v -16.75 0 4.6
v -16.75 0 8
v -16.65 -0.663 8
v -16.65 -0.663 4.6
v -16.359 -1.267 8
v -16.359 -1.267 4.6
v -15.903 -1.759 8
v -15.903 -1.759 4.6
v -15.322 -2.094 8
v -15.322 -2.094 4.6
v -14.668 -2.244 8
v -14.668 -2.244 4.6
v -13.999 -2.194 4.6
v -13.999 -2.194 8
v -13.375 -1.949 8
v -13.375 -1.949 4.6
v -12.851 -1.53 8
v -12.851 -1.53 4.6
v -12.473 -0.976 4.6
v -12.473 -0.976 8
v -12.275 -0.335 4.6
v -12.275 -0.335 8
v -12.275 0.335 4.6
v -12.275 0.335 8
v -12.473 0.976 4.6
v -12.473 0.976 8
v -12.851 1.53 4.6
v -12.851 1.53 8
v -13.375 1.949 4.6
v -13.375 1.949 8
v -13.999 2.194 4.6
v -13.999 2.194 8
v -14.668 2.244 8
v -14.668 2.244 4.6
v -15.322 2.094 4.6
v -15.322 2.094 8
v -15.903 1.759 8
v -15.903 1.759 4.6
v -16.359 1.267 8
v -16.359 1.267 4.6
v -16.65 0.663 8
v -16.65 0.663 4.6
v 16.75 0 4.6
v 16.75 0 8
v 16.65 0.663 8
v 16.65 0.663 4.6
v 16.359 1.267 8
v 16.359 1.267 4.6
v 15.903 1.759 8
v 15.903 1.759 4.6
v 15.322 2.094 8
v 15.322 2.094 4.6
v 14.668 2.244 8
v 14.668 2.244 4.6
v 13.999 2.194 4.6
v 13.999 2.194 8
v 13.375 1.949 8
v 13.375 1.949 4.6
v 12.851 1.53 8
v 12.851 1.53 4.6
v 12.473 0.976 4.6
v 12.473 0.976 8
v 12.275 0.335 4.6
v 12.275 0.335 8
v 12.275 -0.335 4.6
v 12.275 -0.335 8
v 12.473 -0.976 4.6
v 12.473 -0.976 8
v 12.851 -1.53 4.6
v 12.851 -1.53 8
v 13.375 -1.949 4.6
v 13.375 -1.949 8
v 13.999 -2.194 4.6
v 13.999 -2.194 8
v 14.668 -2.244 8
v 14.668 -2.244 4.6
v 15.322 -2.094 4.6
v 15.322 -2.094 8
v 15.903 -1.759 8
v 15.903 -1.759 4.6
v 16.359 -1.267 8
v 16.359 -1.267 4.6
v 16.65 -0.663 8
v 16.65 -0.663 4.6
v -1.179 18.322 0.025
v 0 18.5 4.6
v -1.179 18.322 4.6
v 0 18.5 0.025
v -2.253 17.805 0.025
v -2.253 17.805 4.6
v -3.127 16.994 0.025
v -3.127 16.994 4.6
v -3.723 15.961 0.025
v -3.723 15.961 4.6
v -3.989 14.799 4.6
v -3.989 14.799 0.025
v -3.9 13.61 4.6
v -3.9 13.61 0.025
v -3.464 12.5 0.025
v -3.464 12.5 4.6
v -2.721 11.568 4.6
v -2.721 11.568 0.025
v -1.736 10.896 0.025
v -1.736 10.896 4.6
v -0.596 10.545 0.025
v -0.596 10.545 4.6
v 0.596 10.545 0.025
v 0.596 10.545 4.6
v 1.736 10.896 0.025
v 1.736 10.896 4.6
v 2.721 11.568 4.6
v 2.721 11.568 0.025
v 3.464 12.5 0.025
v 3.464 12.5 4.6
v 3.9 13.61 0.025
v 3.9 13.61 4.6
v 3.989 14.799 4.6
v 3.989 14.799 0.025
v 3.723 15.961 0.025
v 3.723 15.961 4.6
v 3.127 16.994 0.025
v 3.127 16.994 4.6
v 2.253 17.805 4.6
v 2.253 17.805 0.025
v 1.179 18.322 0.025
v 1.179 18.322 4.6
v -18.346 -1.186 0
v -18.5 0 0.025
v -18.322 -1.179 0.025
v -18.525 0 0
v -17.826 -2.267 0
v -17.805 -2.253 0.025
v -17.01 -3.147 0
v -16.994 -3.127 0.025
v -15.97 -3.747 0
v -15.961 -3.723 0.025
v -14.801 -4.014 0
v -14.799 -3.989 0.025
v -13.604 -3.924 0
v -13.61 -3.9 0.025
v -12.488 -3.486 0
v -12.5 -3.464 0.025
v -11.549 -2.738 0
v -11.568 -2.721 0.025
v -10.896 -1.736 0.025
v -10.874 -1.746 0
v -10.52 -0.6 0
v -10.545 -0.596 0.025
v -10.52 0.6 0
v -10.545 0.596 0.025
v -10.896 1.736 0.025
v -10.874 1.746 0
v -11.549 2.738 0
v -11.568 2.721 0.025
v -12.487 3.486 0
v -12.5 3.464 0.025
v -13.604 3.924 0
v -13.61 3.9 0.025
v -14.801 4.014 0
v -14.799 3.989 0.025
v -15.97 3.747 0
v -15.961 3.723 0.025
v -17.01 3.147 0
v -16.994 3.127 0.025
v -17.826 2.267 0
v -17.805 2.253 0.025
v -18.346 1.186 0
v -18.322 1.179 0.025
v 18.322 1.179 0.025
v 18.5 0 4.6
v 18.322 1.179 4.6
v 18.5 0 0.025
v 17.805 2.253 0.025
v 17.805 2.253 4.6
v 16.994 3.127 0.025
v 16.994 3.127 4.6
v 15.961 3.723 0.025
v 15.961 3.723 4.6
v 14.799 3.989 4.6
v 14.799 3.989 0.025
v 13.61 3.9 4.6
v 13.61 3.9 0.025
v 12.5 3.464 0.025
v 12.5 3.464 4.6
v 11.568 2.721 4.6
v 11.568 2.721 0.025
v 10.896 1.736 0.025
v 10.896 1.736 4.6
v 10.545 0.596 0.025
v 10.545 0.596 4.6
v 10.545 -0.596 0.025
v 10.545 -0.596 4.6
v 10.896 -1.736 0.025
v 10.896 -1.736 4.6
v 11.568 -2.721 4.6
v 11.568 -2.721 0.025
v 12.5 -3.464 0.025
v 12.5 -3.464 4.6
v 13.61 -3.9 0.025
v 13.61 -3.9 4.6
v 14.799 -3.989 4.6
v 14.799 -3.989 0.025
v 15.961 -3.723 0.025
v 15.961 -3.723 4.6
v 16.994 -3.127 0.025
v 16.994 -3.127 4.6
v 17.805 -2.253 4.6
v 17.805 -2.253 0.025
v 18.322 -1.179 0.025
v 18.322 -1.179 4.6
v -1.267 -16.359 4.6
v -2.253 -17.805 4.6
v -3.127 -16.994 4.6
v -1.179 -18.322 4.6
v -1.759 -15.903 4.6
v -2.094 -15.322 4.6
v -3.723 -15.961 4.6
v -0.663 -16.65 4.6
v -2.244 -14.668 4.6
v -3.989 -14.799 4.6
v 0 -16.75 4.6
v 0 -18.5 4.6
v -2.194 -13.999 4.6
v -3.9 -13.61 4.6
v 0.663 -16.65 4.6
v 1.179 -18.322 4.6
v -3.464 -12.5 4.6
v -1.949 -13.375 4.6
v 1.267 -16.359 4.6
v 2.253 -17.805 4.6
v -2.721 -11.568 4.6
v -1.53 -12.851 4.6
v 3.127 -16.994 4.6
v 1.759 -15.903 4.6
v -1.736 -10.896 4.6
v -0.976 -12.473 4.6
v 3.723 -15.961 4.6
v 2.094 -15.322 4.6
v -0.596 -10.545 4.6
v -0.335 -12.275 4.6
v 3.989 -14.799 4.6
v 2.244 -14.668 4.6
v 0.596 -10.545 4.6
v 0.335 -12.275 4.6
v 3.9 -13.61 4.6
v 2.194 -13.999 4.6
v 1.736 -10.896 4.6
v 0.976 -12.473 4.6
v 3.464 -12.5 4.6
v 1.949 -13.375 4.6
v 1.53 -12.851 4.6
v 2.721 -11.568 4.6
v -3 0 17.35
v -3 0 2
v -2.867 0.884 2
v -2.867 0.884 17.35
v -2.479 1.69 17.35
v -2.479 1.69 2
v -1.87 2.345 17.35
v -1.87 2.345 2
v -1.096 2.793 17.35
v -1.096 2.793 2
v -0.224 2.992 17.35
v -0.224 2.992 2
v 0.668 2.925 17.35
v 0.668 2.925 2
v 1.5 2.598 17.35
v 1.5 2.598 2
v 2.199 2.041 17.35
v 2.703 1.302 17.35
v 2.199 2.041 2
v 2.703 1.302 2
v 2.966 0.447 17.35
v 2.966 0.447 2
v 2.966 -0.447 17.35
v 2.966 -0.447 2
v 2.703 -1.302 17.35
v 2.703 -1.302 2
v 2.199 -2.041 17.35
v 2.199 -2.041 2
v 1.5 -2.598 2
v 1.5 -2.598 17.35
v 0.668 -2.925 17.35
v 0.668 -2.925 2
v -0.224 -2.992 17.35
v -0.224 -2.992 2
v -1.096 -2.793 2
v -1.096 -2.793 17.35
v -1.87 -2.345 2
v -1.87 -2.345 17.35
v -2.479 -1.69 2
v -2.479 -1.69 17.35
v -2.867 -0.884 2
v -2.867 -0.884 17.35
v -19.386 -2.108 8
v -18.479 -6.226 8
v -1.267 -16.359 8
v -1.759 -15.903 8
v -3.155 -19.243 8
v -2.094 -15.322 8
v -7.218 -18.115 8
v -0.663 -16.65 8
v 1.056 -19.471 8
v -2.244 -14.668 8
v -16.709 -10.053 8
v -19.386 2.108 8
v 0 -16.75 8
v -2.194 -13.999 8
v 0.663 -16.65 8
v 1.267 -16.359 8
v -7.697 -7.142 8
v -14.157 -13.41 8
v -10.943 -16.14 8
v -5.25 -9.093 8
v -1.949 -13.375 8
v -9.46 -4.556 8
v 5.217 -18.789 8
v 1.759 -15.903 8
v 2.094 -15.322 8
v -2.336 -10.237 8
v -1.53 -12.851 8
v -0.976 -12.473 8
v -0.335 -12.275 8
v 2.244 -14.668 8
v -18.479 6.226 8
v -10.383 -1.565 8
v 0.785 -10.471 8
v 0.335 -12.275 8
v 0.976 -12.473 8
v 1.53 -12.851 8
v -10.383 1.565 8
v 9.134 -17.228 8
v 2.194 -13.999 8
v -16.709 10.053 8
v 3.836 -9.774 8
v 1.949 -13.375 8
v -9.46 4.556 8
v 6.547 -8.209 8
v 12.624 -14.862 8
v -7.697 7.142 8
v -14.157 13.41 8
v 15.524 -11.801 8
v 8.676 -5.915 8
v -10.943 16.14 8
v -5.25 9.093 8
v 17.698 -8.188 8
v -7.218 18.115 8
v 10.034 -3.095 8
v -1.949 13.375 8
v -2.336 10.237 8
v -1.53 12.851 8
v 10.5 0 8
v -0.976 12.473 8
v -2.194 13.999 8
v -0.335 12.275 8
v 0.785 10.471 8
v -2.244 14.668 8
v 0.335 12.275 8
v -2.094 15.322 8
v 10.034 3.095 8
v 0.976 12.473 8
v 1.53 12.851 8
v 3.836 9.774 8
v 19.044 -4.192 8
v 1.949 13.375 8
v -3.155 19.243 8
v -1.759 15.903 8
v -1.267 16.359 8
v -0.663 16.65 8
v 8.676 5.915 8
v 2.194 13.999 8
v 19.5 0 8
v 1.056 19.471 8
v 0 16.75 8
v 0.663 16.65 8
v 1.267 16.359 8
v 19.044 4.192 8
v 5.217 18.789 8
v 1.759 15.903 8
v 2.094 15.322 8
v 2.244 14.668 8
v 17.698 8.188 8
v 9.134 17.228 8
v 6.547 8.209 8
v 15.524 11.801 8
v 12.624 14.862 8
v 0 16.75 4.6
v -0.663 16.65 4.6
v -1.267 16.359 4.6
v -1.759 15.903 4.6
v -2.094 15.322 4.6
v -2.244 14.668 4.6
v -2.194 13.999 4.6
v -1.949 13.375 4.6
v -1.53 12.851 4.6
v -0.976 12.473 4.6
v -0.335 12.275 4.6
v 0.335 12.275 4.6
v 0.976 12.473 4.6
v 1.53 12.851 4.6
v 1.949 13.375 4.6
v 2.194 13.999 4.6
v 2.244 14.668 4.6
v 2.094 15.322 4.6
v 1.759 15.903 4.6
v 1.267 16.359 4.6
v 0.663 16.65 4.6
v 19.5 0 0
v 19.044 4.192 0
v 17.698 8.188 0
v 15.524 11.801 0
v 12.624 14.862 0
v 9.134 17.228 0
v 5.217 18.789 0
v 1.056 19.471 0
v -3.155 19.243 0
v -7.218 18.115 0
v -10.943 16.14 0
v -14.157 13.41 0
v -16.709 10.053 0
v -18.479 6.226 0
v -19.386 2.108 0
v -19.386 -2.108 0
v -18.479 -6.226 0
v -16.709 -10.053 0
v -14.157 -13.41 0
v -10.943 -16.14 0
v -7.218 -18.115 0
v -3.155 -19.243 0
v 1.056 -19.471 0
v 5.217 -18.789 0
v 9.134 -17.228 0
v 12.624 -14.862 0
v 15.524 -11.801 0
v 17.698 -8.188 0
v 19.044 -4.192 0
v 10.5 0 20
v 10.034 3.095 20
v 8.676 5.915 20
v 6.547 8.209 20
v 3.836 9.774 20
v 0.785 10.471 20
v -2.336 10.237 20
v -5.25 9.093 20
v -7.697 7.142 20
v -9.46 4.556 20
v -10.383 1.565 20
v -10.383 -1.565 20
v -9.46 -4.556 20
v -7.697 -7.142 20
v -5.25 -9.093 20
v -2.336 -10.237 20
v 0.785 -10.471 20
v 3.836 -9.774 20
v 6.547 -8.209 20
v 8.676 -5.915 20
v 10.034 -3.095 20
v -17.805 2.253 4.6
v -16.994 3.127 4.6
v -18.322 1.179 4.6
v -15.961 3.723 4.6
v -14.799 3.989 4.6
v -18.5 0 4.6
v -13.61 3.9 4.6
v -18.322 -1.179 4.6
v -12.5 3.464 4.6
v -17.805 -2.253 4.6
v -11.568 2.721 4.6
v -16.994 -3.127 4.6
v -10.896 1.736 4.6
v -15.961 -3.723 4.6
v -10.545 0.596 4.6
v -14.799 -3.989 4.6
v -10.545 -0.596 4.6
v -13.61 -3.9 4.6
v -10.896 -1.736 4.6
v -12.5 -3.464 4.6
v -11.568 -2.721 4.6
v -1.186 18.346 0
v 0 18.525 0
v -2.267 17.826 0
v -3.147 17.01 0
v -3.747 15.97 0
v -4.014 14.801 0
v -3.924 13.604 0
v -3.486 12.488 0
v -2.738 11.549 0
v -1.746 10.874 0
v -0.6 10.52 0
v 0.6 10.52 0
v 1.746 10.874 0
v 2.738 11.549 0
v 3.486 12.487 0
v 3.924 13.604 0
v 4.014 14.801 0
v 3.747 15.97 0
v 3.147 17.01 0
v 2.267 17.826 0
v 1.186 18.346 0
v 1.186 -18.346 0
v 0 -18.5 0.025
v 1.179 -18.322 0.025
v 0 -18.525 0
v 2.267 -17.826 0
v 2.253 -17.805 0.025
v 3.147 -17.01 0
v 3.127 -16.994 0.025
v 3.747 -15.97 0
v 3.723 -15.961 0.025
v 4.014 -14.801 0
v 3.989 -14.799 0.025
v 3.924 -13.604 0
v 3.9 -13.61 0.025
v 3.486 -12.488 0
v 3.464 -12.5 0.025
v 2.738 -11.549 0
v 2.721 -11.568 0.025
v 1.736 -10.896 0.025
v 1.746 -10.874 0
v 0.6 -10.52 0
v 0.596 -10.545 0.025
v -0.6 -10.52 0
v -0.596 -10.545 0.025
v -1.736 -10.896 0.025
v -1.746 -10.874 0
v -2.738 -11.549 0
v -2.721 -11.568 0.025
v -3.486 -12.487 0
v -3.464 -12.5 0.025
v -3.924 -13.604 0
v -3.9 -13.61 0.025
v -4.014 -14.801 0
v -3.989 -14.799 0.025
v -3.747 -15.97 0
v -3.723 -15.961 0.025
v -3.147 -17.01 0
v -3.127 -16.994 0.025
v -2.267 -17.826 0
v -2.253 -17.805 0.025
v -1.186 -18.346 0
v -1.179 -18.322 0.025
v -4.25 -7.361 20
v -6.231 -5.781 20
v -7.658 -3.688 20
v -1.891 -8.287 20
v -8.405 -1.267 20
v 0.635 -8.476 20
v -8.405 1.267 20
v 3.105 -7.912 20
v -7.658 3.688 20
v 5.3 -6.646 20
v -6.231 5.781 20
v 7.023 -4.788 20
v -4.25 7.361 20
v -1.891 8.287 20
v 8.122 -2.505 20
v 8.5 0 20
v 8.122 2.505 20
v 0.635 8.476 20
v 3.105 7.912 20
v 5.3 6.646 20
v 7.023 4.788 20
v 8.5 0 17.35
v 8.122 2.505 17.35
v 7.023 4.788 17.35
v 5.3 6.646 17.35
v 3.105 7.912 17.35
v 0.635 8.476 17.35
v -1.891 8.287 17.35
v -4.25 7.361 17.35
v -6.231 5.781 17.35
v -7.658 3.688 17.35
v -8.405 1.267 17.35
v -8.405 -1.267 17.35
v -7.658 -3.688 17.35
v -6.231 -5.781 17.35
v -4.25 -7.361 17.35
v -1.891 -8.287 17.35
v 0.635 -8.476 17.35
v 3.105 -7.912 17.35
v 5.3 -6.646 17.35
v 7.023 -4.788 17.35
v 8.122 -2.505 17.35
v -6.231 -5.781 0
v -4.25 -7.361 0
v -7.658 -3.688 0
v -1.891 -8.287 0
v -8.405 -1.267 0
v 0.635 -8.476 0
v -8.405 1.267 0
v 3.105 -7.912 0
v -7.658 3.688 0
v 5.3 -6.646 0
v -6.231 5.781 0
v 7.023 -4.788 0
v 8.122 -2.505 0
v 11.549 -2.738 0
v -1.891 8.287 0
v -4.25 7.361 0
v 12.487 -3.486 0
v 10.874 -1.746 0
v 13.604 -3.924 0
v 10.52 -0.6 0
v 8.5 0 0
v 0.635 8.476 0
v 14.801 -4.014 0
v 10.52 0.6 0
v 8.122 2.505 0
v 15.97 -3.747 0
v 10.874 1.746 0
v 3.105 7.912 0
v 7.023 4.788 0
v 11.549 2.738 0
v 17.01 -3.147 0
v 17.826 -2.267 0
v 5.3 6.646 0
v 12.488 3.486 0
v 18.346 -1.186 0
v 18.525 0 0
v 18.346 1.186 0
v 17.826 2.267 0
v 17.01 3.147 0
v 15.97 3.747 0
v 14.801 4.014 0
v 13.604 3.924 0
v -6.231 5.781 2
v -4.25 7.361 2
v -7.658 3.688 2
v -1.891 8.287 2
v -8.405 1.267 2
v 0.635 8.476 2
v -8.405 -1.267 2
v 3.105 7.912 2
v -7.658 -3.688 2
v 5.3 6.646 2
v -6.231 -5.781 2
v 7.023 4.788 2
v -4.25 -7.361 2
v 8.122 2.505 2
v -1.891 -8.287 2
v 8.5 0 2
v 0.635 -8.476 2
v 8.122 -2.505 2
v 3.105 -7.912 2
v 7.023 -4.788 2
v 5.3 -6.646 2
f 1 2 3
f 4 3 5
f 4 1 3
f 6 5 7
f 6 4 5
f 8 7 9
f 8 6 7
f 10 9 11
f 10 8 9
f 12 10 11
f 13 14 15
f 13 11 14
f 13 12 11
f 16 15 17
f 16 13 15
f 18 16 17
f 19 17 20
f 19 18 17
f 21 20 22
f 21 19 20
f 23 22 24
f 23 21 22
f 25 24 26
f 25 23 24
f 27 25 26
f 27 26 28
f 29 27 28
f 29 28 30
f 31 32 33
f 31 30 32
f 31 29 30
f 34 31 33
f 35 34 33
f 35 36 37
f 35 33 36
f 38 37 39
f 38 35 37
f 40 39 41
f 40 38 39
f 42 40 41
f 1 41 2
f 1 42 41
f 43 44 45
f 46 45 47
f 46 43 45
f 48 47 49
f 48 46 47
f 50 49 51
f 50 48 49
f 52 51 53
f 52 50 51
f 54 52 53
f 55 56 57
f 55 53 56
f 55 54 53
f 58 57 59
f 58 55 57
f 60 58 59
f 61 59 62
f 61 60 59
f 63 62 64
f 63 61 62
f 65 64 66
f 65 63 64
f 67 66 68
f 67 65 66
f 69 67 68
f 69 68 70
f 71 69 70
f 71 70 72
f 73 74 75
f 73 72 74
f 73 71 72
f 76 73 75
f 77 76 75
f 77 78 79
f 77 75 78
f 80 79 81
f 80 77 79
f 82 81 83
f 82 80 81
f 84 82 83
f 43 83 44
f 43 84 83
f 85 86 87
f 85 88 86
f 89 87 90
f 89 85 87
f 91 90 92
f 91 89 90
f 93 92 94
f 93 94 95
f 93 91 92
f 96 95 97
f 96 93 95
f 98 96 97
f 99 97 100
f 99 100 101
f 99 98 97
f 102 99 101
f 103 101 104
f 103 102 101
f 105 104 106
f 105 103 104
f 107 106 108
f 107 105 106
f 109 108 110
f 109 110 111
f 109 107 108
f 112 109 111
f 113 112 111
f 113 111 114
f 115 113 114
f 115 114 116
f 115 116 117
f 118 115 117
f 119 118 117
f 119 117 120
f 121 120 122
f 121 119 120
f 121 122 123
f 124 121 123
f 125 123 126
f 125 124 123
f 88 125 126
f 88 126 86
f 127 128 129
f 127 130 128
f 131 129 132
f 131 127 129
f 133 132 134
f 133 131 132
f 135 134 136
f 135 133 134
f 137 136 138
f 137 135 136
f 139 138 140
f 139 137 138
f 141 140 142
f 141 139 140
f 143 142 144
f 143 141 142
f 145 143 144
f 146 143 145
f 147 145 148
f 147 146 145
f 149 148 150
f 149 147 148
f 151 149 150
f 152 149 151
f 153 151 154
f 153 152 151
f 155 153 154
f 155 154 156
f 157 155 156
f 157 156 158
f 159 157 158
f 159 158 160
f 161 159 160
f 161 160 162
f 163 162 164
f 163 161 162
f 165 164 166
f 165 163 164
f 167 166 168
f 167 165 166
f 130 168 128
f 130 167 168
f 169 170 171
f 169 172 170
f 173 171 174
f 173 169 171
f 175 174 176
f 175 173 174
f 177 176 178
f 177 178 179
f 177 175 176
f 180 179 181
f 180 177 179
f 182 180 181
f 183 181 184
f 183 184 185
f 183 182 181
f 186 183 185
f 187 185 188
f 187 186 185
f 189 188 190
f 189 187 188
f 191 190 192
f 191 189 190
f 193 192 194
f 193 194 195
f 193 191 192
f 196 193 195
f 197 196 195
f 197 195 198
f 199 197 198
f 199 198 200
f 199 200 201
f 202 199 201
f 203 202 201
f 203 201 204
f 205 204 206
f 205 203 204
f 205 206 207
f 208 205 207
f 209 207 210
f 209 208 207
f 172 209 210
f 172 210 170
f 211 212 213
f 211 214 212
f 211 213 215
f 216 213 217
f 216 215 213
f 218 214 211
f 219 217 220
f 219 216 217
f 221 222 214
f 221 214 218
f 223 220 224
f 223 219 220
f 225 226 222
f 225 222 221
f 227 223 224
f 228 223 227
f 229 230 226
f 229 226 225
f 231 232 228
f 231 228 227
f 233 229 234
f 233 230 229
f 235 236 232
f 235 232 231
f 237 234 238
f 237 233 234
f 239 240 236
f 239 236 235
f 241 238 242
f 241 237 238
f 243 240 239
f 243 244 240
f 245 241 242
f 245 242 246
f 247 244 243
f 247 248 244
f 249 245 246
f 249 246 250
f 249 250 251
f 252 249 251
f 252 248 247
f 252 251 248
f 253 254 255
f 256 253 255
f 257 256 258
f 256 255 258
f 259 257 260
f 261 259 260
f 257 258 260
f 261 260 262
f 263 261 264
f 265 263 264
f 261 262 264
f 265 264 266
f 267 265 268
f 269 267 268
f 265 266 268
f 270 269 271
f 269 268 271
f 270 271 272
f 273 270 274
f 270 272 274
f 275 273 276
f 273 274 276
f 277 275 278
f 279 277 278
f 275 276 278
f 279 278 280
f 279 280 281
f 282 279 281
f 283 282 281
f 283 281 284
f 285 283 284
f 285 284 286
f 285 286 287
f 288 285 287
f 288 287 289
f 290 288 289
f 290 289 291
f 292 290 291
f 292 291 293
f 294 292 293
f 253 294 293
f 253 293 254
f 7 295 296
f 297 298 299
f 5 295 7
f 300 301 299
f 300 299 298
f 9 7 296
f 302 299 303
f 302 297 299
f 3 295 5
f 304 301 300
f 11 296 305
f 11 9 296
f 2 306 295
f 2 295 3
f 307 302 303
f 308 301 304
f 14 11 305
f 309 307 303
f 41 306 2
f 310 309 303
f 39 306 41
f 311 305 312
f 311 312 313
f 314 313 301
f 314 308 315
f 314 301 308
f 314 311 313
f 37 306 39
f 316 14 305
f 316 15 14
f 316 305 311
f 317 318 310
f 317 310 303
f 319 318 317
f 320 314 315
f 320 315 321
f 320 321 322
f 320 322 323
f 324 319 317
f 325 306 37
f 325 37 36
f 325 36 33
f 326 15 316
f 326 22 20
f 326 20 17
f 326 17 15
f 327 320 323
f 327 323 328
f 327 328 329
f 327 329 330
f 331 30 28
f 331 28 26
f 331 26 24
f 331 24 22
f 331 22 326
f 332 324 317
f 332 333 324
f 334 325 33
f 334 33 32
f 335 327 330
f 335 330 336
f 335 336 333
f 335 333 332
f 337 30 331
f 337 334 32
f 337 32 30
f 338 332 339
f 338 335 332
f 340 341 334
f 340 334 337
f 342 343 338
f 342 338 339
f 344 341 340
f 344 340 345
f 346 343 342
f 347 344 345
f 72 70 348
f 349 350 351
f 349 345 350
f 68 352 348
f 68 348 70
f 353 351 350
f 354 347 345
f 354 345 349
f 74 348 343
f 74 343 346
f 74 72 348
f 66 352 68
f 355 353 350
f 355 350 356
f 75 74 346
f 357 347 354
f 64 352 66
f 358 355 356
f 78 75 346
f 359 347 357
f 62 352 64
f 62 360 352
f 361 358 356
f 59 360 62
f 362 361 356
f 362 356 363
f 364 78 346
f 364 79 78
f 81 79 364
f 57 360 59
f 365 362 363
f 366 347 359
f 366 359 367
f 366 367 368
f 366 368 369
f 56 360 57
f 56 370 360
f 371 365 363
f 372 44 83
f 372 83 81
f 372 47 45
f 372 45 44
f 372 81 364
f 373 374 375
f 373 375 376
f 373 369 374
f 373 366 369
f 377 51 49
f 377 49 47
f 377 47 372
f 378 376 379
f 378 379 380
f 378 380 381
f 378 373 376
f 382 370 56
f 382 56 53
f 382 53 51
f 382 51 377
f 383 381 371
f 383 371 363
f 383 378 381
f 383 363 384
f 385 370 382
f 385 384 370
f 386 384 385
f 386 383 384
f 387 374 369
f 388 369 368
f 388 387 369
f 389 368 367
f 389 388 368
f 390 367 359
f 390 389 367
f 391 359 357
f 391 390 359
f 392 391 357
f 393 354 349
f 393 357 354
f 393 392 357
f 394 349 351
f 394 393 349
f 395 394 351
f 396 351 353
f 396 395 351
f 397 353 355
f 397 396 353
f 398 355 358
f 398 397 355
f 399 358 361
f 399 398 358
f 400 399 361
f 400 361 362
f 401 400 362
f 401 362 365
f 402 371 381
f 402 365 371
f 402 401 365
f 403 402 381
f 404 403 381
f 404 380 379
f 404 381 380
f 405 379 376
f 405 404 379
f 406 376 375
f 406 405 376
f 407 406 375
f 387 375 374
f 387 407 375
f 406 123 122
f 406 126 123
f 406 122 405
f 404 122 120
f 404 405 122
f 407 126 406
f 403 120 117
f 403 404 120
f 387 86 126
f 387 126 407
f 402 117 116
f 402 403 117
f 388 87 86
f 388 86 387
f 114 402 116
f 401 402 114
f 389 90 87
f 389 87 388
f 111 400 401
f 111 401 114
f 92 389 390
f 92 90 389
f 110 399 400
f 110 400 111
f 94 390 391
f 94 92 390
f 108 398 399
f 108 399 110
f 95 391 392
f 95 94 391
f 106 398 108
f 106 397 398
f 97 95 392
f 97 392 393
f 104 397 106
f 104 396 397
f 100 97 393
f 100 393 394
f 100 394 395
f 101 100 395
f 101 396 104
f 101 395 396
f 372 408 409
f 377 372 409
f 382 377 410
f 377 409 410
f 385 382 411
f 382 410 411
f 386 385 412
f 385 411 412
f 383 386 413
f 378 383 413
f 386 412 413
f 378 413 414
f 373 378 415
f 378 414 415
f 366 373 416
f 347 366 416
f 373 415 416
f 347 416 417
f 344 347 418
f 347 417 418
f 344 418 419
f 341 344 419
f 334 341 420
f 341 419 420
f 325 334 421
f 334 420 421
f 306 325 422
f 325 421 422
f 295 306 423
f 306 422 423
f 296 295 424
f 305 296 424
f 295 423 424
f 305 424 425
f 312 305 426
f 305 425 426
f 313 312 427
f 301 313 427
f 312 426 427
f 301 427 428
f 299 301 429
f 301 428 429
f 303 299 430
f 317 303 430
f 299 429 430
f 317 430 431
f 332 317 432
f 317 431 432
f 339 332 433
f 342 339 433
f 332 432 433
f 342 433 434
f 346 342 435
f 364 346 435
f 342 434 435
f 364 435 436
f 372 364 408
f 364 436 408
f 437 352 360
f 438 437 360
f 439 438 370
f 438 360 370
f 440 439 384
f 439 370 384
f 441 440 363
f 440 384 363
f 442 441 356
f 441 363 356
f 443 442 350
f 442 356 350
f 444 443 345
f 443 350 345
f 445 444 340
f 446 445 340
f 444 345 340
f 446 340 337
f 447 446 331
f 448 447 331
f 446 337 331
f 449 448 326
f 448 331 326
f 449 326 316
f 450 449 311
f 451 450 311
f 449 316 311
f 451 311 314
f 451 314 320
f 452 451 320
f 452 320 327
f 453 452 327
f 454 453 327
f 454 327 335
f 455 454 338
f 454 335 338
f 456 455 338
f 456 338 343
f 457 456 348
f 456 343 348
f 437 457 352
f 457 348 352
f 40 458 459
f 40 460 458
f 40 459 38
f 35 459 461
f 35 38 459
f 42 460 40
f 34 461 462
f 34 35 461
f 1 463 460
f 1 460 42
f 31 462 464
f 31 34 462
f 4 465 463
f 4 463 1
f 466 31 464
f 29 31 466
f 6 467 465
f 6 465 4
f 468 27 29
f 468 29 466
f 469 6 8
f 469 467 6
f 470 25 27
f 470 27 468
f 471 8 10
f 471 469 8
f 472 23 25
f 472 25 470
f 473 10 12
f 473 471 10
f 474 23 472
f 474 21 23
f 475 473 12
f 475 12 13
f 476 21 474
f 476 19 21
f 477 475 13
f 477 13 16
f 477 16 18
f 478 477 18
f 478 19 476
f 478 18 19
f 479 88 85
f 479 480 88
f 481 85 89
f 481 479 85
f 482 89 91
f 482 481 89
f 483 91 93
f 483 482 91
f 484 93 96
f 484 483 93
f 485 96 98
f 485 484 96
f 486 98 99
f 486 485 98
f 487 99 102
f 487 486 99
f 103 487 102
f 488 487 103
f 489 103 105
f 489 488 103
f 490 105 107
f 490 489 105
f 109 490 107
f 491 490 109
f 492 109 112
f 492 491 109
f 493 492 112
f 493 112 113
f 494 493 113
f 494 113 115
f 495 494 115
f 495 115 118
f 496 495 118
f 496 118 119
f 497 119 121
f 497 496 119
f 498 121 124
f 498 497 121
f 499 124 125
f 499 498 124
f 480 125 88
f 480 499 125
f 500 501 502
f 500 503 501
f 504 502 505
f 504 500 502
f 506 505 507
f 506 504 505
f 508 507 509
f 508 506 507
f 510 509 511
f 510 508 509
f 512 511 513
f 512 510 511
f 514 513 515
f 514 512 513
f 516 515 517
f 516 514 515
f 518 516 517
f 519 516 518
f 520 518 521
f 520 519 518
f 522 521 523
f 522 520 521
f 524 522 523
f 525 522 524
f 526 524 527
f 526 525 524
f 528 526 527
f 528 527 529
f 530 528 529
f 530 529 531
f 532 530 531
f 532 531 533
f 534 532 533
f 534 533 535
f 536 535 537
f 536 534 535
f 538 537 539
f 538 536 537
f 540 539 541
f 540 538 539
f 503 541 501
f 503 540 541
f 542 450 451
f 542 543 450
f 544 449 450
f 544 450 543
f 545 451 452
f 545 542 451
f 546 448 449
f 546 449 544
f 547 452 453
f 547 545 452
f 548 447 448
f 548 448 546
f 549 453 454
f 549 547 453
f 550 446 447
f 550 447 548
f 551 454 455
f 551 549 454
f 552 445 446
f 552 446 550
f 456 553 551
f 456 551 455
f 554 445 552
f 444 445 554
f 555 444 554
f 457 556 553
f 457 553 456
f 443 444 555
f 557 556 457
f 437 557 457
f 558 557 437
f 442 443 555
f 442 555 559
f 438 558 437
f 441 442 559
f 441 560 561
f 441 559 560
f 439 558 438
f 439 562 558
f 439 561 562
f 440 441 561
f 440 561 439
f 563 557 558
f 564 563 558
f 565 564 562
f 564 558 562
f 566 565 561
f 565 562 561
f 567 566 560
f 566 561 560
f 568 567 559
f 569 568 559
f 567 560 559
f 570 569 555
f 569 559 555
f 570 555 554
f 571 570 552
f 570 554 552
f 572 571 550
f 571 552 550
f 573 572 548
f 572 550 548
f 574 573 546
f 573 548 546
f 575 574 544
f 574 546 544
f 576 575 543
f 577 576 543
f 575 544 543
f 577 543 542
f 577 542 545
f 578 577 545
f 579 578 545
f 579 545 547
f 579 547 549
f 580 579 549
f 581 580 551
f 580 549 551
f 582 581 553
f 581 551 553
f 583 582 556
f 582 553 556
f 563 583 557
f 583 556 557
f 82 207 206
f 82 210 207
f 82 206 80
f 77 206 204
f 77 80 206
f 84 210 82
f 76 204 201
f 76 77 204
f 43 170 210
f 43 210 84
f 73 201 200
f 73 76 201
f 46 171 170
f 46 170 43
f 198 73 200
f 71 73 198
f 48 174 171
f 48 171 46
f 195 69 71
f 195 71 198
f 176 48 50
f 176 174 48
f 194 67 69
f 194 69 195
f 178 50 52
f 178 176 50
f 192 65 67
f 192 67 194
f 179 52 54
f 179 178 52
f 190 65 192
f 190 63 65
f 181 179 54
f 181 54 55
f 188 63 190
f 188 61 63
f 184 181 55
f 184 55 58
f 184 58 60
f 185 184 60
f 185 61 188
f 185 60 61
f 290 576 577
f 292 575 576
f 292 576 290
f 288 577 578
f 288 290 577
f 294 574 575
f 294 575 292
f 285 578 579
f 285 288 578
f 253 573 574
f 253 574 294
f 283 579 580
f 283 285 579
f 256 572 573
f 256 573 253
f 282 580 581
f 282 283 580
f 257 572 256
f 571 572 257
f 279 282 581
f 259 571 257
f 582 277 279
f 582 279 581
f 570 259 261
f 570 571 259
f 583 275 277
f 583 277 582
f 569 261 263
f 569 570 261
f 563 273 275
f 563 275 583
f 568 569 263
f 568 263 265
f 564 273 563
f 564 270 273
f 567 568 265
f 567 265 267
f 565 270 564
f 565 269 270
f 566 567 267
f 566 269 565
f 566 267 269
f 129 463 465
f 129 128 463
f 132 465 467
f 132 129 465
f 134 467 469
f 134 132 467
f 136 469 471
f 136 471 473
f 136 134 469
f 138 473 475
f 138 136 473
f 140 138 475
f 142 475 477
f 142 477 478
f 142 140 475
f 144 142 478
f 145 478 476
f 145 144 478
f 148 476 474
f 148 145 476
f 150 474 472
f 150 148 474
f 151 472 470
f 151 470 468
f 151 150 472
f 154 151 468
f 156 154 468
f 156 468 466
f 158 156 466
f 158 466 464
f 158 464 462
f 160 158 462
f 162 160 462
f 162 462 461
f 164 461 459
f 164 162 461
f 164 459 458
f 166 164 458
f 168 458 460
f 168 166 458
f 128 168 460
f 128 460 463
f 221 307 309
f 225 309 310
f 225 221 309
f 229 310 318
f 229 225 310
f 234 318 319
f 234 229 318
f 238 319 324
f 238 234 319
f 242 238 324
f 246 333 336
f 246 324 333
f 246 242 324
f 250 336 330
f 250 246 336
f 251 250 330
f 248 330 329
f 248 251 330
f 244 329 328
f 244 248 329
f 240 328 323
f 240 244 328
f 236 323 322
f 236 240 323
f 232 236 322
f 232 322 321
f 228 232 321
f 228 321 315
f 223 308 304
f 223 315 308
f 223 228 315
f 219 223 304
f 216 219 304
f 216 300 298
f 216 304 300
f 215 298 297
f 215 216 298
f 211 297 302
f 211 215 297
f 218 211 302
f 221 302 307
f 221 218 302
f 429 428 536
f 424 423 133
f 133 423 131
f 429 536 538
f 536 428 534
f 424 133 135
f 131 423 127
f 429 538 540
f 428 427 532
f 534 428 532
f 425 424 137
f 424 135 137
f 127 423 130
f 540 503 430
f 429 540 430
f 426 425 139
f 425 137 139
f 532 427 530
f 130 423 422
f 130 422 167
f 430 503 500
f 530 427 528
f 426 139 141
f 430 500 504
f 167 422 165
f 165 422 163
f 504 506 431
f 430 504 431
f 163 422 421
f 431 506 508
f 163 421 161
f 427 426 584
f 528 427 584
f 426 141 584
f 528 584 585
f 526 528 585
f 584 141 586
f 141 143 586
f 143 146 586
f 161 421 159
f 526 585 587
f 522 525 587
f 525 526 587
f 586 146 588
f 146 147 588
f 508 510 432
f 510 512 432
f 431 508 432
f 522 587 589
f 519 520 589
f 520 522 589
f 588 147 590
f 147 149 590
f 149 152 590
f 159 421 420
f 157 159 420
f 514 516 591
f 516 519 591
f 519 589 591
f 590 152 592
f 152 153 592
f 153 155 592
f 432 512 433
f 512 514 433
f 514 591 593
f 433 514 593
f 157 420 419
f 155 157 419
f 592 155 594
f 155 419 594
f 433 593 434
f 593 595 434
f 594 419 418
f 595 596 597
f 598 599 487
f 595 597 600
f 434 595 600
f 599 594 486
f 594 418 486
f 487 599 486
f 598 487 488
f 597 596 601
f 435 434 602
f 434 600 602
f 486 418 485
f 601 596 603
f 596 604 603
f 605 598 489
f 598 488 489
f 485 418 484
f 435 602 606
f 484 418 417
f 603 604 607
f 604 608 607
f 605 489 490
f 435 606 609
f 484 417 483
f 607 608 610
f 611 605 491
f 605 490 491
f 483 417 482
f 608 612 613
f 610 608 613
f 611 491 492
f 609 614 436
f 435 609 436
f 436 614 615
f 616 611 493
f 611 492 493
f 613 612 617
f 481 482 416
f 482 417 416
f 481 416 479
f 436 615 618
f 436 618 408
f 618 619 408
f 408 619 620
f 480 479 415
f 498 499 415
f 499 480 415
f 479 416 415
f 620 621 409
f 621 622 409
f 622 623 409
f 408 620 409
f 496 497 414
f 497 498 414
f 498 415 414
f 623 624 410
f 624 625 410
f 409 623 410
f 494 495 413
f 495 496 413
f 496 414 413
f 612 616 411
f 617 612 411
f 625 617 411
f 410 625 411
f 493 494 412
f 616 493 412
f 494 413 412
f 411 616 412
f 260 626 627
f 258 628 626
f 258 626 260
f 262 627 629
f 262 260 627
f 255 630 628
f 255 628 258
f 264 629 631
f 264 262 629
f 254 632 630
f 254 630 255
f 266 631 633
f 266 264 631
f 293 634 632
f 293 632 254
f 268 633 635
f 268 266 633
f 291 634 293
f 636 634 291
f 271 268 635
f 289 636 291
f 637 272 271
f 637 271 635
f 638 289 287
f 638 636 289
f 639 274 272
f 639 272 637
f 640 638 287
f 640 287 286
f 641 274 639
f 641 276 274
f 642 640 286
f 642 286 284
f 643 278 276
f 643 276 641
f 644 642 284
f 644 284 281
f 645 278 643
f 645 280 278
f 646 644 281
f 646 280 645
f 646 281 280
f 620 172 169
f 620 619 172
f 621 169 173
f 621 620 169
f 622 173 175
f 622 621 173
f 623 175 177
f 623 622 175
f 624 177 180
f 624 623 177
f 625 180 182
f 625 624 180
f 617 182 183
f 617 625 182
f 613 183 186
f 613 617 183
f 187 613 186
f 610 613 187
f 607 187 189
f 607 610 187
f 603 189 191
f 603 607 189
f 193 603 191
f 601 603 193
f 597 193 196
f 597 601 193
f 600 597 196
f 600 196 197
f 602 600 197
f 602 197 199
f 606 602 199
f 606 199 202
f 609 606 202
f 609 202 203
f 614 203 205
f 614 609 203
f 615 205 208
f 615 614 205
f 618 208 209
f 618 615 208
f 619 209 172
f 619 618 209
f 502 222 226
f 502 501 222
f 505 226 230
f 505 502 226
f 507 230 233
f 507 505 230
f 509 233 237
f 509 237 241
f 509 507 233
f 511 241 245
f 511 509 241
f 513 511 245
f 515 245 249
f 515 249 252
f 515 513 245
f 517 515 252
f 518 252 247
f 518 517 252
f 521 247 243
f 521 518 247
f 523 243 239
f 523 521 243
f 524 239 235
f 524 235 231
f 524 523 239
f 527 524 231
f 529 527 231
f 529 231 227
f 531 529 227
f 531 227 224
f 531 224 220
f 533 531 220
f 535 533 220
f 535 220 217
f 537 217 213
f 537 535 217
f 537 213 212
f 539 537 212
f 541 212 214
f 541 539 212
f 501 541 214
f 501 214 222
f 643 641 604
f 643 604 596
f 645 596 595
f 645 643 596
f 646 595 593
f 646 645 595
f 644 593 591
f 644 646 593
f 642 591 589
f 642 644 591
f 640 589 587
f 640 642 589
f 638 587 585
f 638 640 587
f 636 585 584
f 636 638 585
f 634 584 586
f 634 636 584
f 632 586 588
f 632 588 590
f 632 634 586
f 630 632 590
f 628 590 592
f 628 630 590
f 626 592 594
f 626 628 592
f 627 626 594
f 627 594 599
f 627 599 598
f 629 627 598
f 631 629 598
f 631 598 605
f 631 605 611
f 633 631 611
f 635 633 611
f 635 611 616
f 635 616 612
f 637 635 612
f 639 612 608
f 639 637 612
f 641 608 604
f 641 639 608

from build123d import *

# Parameters (mm, degrees)
SKETCH_1_R               = 19.5
EXTRUDE_1_DEPTH          = 8
SKETCH_2_R               = 10.5
EXTRUDE_2_DEPTH          = 12
SKETCH_3_R               = 3
CUT_EXTRUDE_1_DEPTH      = 35.066112194
SKETCH_4_R               = 8.5
CUT_EXTRUDE_3_DEPTH      = 2.65
CUT_EXTRUDE_START        = -2
SKETCH_5_R               = 8.5
CUT_EXTRUDE_4_DEPTH      = 2
PATTERN_CIRCULAR_1_COUNT = 4


with BuildPart() as part:
    # 草图1 → 凸台-拉伸1 (new body)
    with BuildSketch(Plane.XY):
        Circle(SKETCH_1_R)
    extrude(amount=EXTRUDE_1_DEPTH)

    # 草图2 → 凸台-拉伸2 (add)
    with BuildSketch(Plane.XY.offset(8)):
        Circle(SKETCH_2_R)
    extrude(amount=EXTRUDE_2_DEPTH)

    # 草图3 → 切除-拉伸1 (cut, through all)
    with BuildSketch(Plane(origin=(0, 0, 0), x_dir=(-1, 0, 0), z_dir=(0, 0, -1))):
        Circle(SKETCH_3_R)
    extrude(amount=-CUT_EXTRUDE_1_DEPTH, mode=Mode.SUBTRACT)

    # 草图4 → 切除-拉伸3 (cut)
    with BuildSketch(Plane.XY.offset(20)):
        Circle(SKETCH_4_R)
    extrude(amount=-CUT_EXTRUDE_3_DEPTH, mode=Mode.SUBTRACT)

    # 草图5 → 切除-拉伸4 (cut)
    with BuildSketch(Plane(origin=(0, 0, 0), x_dir=(-1, 0, 0), z_dir=(0, 0, -1)).offset(CUT_EXTRUDE_START)):
        with Locations(Location((0, 0, 0), (0, 0, 180))):
            Circle(SKETCH_5_R)
    extrude(amount=CUT_EXTRUDE_4_DEPTH, mode=Mode.SUBTRACT)

    # 草图7 → M4 六角圆柱头螺钉的柱形沉头孔1 (revolve, cut)
    with BuildSketch(Plane(origin=(0, 14.5, 0), x_dir=(0, 1, 0), z_dir=(1, 0, 0))):
        Polygon((0, 0), (0, 20), (2.25, 20), (2.25, 4.6), (4, 4.6), (4, 0.025), (4.025, 0), align=None)
    hole_wizard_m4_1 = revolve(axis=Axis((0, 14.5, -6.35), (0, 0, 1)), mode=Mode.SUBTRACT)

    # 阵列(圆周)1: M4 六角圆柱头螺钉的柱形沉头孔1 ×4 about axis
    pattern_circular_1_axis = Axis((0, 0, 0), (0, 0, 1))
    for i in range(1, PATTERN_CIRCULAR_1_COUNT):
        add(hole_wizard_m4_1.rotate(pattern_circular_1_axis, i * 360 / PATTERN_CIRCULAR_1_COUNT), mode=Mode.SUBTRACT)


solid = part.part
